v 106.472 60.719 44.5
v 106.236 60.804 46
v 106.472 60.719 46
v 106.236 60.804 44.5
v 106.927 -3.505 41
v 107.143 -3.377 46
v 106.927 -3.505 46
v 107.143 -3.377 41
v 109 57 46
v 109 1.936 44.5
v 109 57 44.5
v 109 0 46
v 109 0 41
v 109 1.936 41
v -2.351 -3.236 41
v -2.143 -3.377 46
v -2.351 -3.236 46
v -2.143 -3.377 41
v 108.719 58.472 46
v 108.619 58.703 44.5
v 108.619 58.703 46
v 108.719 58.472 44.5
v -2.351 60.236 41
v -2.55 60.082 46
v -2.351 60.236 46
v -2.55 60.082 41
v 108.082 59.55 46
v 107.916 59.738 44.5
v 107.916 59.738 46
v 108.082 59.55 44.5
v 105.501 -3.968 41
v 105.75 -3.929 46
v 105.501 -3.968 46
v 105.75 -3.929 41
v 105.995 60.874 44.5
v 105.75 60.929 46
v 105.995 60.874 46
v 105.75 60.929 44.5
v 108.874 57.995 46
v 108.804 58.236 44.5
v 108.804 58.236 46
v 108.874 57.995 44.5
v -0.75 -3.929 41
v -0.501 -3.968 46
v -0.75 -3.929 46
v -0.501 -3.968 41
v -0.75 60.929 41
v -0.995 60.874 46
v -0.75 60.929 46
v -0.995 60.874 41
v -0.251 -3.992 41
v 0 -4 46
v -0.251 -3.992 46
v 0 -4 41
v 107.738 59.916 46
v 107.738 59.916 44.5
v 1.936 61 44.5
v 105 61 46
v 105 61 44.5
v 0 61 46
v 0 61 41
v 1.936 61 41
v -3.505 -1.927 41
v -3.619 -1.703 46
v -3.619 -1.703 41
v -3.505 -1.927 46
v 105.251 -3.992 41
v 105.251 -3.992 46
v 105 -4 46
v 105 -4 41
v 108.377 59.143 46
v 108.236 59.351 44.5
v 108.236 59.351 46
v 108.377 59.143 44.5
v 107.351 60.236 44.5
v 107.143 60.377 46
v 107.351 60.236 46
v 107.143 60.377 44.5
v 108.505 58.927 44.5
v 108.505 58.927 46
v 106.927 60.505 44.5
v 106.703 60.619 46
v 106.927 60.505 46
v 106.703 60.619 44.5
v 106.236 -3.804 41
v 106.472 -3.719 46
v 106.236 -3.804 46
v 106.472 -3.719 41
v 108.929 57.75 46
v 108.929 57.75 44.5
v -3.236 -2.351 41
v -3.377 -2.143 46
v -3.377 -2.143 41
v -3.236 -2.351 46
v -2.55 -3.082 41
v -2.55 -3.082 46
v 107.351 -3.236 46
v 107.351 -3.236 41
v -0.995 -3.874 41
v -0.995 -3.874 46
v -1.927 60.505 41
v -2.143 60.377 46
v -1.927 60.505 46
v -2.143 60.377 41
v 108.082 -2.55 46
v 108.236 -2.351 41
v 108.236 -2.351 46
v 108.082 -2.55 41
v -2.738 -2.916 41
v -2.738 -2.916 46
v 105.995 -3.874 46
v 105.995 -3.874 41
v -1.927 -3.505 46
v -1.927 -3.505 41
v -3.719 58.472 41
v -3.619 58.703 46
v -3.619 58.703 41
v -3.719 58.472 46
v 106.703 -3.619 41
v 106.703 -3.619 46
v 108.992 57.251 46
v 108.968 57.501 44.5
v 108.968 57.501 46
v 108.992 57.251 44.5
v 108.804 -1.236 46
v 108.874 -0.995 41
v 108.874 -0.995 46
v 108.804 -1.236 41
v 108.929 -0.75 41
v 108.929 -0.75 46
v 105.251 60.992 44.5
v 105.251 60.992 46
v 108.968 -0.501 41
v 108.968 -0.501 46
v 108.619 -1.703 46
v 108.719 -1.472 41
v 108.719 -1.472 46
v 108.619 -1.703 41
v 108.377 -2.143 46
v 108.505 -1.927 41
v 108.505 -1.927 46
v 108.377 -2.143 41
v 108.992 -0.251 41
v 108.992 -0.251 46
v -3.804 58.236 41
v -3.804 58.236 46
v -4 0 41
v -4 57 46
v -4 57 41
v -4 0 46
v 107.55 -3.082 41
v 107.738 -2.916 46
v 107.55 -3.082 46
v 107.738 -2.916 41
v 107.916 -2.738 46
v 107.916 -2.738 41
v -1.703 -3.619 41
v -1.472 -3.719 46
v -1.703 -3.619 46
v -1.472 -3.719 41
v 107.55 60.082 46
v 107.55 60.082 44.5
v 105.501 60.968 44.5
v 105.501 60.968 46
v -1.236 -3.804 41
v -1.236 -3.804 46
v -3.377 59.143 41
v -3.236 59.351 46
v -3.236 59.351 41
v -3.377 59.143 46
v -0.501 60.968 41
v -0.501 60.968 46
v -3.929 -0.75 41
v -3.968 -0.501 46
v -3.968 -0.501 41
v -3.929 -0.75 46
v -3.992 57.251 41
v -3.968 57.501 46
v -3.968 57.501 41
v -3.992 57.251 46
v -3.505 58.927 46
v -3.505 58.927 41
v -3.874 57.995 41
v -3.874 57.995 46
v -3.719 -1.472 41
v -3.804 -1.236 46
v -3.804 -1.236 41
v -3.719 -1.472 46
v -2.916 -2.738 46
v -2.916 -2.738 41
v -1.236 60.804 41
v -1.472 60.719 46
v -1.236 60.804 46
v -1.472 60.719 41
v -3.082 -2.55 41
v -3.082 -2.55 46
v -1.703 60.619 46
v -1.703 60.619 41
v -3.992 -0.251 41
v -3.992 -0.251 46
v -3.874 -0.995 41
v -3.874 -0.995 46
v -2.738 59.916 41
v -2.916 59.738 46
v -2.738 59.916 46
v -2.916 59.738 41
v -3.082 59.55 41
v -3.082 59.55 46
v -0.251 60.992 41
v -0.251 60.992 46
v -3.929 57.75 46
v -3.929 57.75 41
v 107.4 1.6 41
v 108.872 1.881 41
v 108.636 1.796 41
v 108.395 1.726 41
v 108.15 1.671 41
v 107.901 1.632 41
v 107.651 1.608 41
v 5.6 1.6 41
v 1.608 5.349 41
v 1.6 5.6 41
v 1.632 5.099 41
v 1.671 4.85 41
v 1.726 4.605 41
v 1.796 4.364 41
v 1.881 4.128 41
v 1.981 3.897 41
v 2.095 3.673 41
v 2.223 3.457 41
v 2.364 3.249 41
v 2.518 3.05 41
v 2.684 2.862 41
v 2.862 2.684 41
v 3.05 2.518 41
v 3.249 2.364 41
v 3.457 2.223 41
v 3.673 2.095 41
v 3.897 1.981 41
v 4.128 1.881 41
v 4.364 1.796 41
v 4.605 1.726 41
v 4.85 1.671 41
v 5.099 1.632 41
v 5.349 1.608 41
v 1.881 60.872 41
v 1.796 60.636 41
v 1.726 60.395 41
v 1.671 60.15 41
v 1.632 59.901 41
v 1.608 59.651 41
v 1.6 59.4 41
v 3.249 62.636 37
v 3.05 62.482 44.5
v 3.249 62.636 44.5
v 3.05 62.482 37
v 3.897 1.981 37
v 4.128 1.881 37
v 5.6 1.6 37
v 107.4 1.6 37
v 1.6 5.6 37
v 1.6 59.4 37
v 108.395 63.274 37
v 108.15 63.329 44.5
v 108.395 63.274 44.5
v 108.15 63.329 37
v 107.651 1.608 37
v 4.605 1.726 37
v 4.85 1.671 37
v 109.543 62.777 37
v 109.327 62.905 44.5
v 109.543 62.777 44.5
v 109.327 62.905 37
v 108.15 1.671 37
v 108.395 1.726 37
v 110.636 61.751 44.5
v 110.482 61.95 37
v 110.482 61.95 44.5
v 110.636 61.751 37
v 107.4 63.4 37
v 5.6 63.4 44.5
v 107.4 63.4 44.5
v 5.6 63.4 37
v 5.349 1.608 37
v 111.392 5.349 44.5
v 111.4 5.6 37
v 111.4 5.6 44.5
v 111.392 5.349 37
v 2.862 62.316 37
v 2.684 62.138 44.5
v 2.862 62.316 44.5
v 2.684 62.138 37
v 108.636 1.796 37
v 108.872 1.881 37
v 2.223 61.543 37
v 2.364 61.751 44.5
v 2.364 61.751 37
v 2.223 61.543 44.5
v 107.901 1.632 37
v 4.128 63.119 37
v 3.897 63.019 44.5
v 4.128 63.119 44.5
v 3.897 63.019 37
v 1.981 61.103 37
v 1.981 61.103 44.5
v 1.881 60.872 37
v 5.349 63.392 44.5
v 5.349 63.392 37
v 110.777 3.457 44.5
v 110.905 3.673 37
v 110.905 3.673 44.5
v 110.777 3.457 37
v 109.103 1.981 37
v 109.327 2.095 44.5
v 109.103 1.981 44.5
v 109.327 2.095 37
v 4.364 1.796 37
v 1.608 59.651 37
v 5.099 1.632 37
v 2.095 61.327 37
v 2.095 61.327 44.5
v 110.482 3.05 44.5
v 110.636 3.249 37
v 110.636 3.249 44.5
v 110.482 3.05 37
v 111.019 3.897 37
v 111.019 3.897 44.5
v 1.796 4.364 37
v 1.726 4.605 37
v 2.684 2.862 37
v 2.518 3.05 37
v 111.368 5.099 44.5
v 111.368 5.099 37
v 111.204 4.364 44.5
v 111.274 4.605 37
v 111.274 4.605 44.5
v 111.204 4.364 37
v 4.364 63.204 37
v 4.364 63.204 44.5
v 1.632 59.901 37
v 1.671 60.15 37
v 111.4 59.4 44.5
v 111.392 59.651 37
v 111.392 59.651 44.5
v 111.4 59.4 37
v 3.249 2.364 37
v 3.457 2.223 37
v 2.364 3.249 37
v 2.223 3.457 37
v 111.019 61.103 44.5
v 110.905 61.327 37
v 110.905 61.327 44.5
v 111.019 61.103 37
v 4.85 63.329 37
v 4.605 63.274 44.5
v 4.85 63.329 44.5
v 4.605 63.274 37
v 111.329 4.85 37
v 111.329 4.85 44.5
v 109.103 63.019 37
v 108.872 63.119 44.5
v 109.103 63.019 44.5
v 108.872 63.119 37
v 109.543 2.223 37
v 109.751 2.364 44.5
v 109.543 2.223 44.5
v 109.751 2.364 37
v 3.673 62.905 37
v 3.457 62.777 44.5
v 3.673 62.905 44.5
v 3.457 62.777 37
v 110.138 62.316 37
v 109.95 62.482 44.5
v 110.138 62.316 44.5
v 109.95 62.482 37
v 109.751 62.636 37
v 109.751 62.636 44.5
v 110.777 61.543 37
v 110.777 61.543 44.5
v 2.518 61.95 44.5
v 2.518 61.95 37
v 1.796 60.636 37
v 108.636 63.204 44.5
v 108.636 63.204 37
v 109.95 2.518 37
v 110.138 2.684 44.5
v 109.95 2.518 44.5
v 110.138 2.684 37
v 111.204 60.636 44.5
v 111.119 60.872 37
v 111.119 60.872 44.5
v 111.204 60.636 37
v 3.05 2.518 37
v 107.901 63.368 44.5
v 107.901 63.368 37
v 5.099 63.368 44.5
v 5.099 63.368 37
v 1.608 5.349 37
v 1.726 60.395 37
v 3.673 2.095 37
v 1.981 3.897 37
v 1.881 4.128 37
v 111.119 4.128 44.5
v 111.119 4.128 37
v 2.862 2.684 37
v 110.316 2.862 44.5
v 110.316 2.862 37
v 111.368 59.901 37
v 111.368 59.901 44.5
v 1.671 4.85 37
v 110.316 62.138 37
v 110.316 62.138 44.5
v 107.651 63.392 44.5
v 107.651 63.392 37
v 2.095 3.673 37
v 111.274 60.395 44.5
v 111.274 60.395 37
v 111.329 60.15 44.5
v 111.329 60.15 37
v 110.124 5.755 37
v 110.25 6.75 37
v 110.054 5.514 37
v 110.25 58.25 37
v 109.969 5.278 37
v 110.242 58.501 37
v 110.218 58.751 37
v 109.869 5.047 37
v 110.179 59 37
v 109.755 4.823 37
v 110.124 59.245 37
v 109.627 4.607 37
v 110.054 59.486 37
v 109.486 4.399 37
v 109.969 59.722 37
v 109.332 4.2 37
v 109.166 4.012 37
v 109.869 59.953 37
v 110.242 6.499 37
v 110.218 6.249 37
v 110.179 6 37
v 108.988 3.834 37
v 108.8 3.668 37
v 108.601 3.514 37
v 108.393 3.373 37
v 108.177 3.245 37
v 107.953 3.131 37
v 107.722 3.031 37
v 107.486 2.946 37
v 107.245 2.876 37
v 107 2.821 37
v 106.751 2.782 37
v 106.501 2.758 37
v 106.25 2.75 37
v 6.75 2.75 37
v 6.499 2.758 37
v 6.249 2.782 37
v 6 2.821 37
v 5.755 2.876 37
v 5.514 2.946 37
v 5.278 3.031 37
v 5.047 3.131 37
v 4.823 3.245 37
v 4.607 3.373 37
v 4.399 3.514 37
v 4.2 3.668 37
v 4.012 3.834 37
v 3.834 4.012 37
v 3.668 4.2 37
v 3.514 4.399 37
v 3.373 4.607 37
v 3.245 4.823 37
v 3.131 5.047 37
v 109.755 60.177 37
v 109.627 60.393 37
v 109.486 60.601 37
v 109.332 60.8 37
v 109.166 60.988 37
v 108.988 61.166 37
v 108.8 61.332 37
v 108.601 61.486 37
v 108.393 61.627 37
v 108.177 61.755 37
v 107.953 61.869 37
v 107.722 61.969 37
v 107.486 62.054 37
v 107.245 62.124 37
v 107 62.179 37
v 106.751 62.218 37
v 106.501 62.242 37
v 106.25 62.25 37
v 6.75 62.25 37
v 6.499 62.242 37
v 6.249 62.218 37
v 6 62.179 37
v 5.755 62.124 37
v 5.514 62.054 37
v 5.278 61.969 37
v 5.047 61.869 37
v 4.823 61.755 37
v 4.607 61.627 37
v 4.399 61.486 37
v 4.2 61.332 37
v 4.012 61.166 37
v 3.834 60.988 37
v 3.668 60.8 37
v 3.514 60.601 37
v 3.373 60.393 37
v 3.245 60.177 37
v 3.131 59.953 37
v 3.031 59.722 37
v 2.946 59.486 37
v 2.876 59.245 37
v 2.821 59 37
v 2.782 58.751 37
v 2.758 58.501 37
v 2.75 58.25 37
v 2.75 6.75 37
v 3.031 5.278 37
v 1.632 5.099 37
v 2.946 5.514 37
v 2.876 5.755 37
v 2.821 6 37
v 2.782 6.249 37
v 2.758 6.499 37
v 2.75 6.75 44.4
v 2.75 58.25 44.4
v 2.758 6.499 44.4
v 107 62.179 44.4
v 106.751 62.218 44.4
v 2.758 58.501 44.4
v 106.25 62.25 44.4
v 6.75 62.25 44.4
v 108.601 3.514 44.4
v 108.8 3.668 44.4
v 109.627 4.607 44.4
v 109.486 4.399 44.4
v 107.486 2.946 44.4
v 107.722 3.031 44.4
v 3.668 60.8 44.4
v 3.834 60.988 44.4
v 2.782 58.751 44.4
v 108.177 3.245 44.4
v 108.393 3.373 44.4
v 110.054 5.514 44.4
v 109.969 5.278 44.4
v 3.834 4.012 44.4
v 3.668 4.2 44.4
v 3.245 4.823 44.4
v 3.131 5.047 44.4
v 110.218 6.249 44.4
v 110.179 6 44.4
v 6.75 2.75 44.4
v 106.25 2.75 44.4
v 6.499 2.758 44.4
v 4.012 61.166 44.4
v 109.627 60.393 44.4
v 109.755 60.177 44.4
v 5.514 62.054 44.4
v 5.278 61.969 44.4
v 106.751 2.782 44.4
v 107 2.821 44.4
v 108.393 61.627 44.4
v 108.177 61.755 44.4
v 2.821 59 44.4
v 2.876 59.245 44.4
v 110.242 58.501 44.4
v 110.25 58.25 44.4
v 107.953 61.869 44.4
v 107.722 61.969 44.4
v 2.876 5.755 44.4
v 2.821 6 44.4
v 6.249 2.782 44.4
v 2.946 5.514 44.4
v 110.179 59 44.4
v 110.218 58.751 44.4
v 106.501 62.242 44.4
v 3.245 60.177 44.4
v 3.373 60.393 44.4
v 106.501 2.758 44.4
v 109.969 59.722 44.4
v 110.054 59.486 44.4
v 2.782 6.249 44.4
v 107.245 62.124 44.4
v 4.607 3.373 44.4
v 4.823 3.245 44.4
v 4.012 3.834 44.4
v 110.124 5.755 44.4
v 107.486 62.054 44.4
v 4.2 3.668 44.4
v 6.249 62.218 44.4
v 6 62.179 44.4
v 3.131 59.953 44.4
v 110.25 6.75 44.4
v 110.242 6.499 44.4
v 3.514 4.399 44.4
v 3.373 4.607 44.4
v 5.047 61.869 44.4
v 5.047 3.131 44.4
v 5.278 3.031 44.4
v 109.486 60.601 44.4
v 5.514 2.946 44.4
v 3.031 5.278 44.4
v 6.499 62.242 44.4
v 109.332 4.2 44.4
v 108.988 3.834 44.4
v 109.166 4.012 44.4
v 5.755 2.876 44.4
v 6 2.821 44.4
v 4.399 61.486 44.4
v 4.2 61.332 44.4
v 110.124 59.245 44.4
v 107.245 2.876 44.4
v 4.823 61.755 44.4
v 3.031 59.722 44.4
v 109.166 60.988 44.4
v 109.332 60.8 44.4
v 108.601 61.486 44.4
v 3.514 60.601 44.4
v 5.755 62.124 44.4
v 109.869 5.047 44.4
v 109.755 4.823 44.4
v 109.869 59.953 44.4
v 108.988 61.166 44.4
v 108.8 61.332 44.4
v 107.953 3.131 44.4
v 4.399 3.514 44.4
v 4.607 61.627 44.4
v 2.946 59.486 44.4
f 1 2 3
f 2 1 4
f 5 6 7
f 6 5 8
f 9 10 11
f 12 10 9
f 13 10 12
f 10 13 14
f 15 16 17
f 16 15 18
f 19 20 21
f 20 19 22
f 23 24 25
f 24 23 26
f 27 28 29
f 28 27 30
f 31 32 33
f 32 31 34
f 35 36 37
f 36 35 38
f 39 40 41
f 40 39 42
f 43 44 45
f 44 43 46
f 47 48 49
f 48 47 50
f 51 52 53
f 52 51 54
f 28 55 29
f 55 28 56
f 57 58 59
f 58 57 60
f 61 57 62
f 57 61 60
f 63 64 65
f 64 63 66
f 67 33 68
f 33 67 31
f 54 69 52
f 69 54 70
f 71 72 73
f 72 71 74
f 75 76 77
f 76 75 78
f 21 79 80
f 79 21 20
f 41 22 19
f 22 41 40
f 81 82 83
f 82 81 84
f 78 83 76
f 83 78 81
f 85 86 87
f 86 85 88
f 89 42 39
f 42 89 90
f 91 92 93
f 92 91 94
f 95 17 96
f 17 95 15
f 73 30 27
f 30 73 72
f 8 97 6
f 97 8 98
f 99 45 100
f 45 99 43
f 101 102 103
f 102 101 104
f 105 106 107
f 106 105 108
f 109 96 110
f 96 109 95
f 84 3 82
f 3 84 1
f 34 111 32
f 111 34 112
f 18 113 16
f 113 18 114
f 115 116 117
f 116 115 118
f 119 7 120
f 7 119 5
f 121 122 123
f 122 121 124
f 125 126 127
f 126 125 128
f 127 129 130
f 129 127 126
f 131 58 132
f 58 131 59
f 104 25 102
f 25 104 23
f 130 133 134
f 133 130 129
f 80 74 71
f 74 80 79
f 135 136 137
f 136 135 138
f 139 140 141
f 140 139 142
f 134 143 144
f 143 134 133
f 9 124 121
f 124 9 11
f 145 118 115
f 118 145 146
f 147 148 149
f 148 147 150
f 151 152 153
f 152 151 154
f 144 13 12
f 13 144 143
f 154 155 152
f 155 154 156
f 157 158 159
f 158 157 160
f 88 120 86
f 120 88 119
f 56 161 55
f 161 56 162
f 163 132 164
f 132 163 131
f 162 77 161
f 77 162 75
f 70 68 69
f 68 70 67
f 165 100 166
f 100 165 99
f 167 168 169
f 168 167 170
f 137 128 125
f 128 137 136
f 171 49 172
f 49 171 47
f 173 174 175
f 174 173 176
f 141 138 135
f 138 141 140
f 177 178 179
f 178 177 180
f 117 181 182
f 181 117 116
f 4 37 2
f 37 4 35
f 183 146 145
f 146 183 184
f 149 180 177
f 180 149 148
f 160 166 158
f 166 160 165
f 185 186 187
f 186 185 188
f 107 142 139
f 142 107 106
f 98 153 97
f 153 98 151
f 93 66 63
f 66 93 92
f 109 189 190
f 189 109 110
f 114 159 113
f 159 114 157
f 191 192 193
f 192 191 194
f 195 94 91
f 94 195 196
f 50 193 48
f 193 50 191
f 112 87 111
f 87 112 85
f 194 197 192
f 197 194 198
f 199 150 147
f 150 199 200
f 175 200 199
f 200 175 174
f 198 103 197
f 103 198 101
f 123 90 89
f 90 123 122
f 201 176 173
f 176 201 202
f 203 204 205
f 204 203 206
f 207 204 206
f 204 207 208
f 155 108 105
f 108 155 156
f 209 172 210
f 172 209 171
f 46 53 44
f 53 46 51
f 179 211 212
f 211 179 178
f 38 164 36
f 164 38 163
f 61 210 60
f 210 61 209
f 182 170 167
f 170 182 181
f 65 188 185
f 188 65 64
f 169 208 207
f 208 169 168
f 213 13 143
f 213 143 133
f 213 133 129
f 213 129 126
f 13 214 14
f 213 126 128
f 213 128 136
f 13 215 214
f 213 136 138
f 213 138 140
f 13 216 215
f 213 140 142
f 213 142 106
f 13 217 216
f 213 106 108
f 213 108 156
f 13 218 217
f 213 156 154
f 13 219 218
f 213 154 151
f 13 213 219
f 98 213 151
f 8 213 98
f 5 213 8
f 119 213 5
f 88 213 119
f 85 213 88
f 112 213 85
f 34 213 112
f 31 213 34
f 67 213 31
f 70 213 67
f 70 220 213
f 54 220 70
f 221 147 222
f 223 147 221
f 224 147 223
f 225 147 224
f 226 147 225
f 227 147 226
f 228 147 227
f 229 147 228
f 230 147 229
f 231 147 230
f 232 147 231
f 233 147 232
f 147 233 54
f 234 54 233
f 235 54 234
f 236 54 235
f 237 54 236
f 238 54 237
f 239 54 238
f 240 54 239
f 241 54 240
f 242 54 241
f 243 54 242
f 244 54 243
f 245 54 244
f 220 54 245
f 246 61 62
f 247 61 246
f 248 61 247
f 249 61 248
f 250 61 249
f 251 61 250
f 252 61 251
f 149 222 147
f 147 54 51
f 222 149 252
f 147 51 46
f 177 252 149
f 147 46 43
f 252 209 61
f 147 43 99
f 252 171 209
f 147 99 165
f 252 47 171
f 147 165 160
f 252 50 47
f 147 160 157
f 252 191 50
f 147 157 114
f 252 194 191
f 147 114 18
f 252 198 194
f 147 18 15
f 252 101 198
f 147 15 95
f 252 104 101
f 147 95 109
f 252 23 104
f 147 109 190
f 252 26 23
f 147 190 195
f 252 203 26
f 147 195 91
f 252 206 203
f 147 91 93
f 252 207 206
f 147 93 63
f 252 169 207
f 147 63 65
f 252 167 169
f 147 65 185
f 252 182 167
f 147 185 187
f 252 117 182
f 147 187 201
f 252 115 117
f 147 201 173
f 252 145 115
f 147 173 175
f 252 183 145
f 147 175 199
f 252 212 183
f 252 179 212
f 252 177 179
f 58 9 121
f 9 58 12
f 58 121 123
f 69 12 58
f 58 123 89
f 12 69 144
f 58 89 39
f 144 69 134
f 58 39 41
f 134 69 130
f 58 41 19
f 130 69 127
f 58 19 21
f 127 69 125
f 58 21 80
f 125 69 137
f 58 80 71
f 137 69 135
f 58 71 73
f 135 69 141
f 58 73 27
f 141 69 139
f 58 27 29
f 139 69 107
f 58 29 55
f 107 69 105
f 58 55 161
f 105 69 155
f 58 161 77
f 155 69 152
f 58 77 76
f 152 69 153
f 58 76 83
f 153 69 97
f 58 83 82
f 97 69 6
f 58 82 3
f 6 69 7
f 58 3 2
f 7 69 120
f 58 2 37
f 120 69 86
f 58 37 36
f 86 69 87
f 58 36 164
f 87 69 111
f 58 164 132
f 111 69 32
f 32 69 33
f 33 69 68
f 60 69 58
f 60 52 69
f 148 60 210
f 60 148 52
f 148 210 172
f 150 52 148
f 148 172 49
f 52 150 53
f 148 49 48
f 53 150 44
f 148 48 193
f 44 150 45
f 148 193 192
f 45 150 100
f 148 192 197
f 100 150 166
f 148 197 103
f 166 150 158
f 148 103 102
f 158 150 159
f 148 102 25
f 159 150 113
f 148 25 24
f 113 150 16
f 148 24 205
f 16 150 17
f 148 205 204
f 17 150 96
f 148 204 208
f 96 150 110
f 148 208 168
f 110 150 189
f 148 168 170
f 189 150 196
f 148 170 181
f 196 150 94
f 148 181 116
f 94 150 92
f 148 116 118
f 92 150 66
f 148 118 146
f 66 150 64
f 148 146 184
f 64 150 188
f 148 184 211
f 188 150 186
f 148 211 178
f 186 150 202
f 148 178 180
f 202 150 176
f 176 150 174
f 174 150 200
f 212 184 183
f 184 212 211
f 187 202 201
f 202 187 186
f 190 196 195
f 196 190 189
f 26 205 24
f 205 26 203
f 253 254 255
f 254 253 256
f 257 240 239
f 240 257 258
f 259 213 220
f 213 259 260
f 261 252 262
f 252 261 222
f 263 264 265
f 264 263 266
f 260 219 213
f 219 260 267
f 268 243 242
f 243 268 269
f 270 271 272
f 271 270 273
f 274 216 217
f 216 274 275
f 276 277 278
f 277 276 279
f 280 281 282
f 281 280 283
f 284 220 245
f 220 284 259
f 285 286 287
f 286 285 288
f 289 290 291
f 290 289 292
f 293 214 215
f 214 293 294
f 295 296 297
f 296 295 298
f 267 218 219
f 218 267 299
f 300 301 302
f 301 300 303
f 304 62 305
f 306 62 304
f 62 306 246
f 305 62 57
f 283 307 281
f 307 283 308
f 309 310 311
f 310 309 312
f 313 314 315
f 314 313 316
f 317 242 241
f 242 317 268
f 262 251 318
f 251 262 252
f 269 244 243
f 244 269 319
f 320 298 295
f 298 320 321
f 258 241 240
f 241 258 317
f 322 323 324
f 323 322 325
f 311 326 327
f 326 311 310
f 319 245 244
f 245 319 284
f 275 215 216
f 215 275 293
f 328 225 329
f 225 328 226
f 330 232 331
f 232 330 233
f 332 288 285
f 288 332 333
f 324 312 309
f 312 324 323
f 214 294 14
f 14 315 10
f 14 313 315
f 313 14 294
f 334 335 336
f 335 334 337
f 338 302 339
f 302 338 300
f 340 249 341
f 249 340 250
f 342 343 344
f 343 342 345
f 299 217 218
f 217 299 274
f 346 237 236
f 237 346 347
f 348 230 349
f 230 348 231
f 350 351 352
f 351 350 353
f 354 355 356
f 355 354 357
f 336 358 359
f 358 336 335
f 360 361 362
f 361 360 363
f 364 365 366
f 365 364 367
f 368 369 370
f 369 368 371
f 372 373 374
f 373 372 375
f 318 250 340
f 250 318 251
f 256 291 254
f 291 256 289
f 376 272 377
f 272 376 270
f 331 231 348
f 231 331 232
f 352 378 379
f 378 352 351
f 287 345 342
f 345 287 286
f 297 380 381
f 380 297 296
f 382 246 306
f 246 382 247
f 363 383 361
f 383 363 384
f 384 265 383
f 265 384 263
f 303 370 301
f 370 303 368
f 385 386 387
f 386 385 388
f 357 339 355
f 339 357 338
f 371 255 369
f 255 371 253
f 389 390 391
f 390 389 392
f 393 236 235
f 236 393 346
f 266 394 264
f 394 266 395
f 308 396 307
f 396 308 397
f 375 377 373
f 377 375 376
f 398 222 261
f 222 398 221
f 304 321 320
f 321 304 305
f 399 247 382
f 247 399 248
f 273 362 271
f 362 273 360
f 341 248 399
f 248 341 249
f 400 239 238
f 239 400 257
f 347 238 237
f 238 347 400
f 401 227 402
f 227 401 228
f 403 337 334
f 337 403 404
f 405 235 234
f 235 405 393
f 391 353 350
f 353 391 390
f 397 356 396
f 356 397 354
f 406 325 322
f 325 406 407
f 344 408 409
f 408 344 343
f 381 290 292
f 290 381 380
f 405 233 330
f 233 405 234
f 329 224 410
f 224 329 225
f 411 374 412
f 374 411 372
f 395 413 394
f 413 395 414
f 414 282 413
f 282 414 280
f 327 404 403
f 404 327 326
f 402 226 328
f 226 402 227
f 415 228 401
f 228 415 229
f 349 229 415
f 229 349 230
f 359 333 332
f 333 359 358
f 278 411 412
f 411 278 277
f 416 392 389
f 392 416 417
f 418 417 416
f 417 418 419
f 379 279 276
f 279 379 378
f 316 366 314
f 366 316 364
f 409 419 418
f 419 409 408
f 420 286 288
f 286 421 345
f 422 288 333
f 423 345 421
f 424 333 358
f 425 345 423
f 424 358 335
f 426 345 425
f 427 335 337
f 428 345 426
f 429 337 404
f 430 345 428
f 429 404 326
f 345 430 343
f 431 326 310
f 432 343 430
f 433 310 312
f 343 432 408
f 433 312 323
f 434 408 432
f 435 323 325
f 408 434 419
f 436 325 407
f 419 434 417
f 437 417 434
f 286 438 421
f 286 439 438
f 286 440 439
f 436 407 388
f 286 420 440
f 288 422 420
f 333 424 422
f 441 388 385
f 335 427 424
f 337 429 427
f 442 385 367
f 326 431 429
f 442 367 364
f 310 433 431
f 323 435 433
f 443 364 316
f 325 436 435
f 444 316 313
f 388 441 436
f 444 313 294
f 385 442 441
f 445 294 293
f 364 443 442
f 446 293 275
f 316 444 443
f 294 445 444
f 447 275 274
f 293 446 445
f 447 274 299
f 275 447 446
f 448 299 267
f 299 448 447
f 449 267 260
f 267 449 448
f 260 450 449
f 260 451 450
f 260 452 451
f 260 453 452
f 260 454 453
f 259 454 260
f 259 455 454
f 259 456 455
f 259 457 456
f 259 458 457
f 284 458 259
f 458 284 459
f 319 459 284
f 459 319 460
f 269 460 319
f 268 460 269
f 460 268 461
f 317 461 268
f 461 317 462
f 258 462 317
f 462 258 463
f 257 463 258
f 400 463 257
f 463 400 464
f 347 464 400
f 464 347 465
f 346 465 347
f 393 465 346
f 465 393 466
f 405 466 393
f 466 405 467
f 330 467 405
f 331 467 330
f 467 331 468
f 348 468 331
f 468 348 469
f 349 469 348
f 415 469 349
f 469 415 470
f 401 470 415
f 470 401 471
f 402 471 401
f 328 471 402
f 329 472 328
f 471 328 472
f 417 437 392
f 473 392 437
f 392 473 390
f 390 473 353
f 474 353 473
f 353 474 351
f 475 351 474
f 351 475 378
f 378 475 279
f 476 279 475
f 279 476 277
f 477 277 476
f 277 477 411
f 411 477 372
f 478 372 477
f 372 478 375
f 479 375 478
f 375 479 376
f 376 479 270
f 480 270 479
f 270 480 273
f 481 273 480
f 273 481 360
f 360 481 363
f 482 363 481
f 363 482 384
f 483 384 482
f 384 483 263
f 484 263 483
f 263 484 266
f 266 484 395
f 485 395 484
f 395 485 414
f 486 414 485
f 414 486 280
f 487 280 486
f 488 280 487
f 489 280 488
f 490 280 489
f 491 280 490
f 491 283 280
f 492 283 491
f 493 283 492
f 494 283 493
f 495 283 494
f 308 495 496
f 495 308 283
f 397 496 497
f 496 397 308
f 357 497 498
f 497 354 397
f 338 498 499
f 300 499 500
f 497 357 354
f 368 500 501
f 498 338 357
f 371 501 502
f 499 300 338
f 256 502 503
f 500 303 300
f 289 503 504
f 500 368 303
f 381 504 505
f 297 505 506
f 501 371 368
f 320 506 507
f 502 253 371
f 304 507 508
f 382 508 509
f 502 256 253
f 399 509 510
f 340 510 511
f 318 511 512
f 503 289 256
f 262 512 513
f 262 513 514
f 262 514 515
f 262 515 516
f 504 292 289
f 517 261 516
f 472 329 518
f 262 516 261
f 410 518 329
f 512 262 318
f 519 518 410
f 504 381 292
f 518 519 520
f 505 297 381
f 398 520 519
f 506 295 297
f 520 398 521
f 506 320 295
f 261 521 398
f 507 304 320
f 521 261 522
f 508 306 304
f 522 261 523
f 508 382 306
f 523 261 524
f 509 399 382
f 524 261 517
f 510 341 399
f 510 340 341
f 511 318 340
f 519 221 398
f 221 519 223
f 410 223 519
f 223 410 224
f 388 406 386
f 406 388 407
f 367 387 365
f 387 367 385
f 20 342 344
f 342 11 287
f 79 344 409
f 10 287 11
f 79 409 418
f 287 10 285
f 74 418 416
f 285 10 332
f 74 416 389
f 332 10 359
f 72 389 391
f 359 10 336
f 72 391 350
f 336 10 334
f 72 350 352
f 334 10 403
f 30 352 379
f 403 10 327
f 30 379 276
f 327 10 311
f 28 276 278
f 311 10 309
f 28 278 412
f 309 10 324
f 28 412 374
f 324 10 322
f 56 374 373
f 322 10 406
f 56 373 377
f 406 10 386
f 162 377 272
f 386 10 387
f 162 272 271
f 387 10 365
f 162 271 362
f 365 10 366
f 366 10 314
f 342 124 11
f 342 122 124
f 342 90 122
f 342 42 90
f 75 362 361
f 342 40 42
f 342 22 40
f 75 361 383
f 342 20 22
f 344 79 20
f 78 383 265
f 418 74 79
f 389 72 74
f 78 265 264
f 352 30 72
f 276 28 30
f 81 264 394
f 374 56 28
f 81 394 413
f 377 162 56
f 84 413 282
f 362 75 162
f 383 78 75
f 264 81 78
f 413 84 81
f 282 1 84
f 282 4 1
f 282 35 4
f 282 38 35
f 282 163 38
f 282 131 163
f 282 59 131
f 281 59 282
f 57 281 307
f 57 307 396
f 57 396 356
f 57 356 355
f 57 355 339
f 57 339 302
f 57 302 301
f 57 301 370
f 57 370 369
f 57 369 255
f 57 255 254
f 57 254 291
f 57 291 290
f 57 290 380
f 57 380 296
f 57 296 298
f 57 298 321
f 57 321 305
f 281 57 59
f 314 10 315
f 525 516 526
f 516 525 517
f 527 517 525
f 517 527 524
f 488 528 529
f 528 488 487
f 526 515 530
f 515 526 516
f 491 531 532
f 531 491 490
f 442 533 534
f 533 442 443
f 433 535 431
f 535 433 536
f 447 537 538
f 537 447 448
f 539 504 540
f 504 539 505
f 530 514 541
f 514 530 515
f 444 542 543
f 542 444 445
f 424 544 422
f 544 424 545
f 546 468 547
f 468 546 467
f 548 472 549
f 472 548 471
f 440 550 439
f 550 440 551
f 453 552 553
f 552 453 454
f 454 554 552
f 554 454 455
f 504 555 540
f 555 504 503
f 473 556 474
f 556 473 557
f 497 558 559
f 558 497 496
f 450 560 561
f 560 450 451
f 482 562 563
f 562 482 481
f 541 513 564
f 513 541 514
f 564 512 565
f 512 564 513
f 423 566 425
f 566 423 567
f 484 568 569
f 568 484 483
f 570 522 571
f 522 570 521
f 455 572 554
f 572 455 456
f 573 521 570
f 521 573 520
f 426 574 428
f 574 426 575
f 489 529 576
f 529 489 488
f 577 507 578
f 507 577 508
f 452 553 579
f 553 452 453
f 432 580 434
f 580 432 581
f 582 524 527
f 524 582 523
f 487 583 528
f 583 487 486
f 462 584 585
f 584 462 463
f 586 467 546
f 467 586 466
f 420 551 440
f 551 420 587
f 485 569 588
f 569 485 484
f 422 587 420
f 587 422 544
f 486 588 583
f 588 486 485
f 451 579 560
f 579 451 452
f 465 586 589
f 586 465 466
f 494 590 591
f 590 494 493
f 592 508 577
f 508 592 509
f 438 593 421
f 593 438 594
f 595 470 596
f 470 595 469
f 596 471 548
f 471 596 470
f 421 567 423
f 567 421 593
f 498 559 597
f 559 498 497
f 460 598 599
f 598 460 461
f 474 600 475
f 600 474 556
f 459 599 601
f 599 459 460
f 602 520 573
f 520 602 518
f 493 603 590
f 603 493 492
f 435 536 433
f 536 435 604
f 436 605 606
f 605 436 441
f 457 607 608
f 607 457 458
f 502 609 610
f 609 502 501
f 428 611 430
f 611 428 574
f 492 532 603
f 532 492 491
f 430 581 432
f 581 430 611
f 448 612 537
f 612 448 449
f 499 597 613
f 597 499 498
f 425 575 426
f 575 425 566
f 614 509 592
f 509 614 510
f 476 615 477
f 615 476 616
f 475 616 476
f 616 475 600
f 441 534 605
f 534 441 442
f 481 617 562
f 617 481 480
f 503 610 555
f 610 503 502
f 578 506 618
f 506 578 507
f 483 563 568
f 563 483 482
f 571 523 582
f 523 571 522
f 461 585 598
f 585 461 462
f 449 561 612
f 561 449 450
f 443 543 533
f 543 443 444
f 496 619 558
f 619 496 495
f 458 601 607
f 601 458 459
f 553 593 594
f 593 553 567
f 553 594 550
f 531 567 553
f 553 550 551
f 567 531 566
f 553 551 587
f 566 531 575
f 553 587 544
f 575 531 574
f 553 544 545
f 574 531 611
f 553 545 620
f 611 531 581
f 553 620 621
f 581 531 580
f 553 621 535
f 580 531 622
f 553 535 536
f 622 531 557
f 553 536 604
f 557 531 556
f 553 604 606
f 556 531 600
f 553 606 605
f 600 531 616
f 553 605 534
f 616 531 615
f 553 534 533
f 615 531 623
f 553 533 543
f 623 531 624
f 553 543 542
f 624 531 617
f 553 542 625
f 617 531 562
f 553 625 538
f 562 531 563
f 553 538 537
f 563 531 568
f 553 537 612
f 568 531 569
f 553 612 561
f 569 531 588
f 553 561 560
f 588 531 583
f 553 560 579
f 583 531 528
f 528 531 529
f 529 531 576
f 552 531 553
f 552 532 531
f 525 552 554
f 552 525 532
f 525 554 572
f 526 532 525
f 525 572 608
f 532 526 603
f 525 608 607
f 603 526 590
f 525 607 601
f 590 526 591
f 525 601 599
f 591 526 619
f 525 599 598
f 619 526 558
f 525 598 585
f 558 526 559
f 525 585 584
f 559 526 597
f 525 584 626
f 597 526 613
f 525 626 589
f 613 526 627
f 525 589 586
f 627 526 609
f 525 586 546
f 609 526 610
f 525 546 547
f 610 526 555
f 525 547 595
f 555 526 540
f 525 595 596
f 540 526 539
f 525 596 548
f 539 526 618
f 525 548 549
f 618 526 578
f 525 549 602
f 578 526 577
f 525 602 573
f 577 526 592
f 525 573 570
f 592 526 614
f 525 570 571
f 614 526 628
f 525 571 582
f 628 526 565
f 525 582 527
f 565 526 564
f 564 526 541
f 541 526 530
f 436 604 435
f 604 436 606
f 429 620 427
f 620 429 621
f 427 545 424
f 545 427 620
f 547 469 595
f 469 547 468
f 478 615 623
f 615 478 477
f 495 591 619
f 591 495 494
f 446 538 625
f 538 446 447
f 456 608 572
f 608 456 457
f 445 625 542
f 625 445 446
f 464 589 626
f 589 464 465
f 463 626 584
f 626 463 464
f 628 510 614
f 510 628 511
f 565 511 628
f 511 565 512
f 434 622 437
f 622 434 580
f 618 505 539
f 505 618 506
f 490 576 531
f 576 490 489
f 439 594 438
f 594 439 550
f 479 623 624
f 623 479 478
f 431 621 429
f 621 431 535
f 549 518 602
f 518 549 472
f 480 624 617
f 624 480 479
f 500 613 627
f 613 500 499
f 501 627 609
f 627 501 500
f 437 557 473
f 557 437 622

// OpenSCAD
echo("Wide Feather ProtoType");

// Different feather boards might be longer.
// PCB is 50mm.
// PCB size needs to be correct for USB A middle point.
pcbHeight = 60;
pcbWidth = 100;
// How thick (deep) the PCB is (typically 1.6mm)
pcbThickness = 1.6;

pcbPaddingYAxis = 1;
pcbPaddingXAxis = 5; // 1mm from the wall.

// Support positions on the PCBs, relatec to the PCB corner.
// does not include bezel/wall thinckness offsets
pcbSupportPositions = [];
pcbSupportPadPositions = [[4,4,0],[96,46,0],[4,46,0],[96,4,0]];
//pcbSupportPinPositions = [[4,4,0],[96,46,0],[4,46,0],[96,4,0]];
pcbSupportPinPositions = [];
pcbSupportHeight = 8;

// How much above the USB A connector inlet to add the the base case height.
additionalBaseDepth = 20;

// Y start position and how far along
// Compute the X start and end based on case size
// Compute the Z start position base and size based on
// the support heights, base height, top height and cutout height required.
endCutoutYStartPosition = 10;
endCutoutHeight = 20;
// Overall Z height - shared between base and top
endCutoutZHeight = 8; 
includeEndCutout = false;

textPosition = [30,21,-3];
textText = "Feather";
includeText = false;
includeArialCutouts = false;

// battery....
showBattery = false;
includeBatteryCompartment = false;

// This will vary based on the ThingyStick
coverDepth = 5; 
//coverDepth = 6;  // Photon directly on the PCB.
echo("coverDepth (Z)" , coverDepth);

include <../ThingyStickCase.scad>;

module PcbHoleModel(x,y) {
    translate([x,y,-5]) {
        cylinder(d=3, h=10);
    }
}

// Note USB A plug is on RHS, but to make case easier
// use PCB upside-down
module PcbModel() {
    translate([2.5+4,2.5,6]) {
        cube([100,50,1.6]);
        PcbHoleModel(4,4);
        PcbHoleModel(96,46);
        PcbHoleModel(4,46);
        PcbHoleModel(96,4);
        
        translate([38.7, 0, 1.6]) {
            // 18.5mm high with headers.
            // 7mm without
            cube([23, 54, 18.5]);
        }
        
        // Top of the PCB
        translate([45, -10, 1.6 + 12.6]) {
            // USB B
            cube([10, 20, 4]);
        }
    }
}

module extraCutouts() {
    
    translate([46+4,-10, 10+pcbSupportHeight]) {
        #cube([13,15,8]);
    }
}

%PcbModel();
buildCase();
